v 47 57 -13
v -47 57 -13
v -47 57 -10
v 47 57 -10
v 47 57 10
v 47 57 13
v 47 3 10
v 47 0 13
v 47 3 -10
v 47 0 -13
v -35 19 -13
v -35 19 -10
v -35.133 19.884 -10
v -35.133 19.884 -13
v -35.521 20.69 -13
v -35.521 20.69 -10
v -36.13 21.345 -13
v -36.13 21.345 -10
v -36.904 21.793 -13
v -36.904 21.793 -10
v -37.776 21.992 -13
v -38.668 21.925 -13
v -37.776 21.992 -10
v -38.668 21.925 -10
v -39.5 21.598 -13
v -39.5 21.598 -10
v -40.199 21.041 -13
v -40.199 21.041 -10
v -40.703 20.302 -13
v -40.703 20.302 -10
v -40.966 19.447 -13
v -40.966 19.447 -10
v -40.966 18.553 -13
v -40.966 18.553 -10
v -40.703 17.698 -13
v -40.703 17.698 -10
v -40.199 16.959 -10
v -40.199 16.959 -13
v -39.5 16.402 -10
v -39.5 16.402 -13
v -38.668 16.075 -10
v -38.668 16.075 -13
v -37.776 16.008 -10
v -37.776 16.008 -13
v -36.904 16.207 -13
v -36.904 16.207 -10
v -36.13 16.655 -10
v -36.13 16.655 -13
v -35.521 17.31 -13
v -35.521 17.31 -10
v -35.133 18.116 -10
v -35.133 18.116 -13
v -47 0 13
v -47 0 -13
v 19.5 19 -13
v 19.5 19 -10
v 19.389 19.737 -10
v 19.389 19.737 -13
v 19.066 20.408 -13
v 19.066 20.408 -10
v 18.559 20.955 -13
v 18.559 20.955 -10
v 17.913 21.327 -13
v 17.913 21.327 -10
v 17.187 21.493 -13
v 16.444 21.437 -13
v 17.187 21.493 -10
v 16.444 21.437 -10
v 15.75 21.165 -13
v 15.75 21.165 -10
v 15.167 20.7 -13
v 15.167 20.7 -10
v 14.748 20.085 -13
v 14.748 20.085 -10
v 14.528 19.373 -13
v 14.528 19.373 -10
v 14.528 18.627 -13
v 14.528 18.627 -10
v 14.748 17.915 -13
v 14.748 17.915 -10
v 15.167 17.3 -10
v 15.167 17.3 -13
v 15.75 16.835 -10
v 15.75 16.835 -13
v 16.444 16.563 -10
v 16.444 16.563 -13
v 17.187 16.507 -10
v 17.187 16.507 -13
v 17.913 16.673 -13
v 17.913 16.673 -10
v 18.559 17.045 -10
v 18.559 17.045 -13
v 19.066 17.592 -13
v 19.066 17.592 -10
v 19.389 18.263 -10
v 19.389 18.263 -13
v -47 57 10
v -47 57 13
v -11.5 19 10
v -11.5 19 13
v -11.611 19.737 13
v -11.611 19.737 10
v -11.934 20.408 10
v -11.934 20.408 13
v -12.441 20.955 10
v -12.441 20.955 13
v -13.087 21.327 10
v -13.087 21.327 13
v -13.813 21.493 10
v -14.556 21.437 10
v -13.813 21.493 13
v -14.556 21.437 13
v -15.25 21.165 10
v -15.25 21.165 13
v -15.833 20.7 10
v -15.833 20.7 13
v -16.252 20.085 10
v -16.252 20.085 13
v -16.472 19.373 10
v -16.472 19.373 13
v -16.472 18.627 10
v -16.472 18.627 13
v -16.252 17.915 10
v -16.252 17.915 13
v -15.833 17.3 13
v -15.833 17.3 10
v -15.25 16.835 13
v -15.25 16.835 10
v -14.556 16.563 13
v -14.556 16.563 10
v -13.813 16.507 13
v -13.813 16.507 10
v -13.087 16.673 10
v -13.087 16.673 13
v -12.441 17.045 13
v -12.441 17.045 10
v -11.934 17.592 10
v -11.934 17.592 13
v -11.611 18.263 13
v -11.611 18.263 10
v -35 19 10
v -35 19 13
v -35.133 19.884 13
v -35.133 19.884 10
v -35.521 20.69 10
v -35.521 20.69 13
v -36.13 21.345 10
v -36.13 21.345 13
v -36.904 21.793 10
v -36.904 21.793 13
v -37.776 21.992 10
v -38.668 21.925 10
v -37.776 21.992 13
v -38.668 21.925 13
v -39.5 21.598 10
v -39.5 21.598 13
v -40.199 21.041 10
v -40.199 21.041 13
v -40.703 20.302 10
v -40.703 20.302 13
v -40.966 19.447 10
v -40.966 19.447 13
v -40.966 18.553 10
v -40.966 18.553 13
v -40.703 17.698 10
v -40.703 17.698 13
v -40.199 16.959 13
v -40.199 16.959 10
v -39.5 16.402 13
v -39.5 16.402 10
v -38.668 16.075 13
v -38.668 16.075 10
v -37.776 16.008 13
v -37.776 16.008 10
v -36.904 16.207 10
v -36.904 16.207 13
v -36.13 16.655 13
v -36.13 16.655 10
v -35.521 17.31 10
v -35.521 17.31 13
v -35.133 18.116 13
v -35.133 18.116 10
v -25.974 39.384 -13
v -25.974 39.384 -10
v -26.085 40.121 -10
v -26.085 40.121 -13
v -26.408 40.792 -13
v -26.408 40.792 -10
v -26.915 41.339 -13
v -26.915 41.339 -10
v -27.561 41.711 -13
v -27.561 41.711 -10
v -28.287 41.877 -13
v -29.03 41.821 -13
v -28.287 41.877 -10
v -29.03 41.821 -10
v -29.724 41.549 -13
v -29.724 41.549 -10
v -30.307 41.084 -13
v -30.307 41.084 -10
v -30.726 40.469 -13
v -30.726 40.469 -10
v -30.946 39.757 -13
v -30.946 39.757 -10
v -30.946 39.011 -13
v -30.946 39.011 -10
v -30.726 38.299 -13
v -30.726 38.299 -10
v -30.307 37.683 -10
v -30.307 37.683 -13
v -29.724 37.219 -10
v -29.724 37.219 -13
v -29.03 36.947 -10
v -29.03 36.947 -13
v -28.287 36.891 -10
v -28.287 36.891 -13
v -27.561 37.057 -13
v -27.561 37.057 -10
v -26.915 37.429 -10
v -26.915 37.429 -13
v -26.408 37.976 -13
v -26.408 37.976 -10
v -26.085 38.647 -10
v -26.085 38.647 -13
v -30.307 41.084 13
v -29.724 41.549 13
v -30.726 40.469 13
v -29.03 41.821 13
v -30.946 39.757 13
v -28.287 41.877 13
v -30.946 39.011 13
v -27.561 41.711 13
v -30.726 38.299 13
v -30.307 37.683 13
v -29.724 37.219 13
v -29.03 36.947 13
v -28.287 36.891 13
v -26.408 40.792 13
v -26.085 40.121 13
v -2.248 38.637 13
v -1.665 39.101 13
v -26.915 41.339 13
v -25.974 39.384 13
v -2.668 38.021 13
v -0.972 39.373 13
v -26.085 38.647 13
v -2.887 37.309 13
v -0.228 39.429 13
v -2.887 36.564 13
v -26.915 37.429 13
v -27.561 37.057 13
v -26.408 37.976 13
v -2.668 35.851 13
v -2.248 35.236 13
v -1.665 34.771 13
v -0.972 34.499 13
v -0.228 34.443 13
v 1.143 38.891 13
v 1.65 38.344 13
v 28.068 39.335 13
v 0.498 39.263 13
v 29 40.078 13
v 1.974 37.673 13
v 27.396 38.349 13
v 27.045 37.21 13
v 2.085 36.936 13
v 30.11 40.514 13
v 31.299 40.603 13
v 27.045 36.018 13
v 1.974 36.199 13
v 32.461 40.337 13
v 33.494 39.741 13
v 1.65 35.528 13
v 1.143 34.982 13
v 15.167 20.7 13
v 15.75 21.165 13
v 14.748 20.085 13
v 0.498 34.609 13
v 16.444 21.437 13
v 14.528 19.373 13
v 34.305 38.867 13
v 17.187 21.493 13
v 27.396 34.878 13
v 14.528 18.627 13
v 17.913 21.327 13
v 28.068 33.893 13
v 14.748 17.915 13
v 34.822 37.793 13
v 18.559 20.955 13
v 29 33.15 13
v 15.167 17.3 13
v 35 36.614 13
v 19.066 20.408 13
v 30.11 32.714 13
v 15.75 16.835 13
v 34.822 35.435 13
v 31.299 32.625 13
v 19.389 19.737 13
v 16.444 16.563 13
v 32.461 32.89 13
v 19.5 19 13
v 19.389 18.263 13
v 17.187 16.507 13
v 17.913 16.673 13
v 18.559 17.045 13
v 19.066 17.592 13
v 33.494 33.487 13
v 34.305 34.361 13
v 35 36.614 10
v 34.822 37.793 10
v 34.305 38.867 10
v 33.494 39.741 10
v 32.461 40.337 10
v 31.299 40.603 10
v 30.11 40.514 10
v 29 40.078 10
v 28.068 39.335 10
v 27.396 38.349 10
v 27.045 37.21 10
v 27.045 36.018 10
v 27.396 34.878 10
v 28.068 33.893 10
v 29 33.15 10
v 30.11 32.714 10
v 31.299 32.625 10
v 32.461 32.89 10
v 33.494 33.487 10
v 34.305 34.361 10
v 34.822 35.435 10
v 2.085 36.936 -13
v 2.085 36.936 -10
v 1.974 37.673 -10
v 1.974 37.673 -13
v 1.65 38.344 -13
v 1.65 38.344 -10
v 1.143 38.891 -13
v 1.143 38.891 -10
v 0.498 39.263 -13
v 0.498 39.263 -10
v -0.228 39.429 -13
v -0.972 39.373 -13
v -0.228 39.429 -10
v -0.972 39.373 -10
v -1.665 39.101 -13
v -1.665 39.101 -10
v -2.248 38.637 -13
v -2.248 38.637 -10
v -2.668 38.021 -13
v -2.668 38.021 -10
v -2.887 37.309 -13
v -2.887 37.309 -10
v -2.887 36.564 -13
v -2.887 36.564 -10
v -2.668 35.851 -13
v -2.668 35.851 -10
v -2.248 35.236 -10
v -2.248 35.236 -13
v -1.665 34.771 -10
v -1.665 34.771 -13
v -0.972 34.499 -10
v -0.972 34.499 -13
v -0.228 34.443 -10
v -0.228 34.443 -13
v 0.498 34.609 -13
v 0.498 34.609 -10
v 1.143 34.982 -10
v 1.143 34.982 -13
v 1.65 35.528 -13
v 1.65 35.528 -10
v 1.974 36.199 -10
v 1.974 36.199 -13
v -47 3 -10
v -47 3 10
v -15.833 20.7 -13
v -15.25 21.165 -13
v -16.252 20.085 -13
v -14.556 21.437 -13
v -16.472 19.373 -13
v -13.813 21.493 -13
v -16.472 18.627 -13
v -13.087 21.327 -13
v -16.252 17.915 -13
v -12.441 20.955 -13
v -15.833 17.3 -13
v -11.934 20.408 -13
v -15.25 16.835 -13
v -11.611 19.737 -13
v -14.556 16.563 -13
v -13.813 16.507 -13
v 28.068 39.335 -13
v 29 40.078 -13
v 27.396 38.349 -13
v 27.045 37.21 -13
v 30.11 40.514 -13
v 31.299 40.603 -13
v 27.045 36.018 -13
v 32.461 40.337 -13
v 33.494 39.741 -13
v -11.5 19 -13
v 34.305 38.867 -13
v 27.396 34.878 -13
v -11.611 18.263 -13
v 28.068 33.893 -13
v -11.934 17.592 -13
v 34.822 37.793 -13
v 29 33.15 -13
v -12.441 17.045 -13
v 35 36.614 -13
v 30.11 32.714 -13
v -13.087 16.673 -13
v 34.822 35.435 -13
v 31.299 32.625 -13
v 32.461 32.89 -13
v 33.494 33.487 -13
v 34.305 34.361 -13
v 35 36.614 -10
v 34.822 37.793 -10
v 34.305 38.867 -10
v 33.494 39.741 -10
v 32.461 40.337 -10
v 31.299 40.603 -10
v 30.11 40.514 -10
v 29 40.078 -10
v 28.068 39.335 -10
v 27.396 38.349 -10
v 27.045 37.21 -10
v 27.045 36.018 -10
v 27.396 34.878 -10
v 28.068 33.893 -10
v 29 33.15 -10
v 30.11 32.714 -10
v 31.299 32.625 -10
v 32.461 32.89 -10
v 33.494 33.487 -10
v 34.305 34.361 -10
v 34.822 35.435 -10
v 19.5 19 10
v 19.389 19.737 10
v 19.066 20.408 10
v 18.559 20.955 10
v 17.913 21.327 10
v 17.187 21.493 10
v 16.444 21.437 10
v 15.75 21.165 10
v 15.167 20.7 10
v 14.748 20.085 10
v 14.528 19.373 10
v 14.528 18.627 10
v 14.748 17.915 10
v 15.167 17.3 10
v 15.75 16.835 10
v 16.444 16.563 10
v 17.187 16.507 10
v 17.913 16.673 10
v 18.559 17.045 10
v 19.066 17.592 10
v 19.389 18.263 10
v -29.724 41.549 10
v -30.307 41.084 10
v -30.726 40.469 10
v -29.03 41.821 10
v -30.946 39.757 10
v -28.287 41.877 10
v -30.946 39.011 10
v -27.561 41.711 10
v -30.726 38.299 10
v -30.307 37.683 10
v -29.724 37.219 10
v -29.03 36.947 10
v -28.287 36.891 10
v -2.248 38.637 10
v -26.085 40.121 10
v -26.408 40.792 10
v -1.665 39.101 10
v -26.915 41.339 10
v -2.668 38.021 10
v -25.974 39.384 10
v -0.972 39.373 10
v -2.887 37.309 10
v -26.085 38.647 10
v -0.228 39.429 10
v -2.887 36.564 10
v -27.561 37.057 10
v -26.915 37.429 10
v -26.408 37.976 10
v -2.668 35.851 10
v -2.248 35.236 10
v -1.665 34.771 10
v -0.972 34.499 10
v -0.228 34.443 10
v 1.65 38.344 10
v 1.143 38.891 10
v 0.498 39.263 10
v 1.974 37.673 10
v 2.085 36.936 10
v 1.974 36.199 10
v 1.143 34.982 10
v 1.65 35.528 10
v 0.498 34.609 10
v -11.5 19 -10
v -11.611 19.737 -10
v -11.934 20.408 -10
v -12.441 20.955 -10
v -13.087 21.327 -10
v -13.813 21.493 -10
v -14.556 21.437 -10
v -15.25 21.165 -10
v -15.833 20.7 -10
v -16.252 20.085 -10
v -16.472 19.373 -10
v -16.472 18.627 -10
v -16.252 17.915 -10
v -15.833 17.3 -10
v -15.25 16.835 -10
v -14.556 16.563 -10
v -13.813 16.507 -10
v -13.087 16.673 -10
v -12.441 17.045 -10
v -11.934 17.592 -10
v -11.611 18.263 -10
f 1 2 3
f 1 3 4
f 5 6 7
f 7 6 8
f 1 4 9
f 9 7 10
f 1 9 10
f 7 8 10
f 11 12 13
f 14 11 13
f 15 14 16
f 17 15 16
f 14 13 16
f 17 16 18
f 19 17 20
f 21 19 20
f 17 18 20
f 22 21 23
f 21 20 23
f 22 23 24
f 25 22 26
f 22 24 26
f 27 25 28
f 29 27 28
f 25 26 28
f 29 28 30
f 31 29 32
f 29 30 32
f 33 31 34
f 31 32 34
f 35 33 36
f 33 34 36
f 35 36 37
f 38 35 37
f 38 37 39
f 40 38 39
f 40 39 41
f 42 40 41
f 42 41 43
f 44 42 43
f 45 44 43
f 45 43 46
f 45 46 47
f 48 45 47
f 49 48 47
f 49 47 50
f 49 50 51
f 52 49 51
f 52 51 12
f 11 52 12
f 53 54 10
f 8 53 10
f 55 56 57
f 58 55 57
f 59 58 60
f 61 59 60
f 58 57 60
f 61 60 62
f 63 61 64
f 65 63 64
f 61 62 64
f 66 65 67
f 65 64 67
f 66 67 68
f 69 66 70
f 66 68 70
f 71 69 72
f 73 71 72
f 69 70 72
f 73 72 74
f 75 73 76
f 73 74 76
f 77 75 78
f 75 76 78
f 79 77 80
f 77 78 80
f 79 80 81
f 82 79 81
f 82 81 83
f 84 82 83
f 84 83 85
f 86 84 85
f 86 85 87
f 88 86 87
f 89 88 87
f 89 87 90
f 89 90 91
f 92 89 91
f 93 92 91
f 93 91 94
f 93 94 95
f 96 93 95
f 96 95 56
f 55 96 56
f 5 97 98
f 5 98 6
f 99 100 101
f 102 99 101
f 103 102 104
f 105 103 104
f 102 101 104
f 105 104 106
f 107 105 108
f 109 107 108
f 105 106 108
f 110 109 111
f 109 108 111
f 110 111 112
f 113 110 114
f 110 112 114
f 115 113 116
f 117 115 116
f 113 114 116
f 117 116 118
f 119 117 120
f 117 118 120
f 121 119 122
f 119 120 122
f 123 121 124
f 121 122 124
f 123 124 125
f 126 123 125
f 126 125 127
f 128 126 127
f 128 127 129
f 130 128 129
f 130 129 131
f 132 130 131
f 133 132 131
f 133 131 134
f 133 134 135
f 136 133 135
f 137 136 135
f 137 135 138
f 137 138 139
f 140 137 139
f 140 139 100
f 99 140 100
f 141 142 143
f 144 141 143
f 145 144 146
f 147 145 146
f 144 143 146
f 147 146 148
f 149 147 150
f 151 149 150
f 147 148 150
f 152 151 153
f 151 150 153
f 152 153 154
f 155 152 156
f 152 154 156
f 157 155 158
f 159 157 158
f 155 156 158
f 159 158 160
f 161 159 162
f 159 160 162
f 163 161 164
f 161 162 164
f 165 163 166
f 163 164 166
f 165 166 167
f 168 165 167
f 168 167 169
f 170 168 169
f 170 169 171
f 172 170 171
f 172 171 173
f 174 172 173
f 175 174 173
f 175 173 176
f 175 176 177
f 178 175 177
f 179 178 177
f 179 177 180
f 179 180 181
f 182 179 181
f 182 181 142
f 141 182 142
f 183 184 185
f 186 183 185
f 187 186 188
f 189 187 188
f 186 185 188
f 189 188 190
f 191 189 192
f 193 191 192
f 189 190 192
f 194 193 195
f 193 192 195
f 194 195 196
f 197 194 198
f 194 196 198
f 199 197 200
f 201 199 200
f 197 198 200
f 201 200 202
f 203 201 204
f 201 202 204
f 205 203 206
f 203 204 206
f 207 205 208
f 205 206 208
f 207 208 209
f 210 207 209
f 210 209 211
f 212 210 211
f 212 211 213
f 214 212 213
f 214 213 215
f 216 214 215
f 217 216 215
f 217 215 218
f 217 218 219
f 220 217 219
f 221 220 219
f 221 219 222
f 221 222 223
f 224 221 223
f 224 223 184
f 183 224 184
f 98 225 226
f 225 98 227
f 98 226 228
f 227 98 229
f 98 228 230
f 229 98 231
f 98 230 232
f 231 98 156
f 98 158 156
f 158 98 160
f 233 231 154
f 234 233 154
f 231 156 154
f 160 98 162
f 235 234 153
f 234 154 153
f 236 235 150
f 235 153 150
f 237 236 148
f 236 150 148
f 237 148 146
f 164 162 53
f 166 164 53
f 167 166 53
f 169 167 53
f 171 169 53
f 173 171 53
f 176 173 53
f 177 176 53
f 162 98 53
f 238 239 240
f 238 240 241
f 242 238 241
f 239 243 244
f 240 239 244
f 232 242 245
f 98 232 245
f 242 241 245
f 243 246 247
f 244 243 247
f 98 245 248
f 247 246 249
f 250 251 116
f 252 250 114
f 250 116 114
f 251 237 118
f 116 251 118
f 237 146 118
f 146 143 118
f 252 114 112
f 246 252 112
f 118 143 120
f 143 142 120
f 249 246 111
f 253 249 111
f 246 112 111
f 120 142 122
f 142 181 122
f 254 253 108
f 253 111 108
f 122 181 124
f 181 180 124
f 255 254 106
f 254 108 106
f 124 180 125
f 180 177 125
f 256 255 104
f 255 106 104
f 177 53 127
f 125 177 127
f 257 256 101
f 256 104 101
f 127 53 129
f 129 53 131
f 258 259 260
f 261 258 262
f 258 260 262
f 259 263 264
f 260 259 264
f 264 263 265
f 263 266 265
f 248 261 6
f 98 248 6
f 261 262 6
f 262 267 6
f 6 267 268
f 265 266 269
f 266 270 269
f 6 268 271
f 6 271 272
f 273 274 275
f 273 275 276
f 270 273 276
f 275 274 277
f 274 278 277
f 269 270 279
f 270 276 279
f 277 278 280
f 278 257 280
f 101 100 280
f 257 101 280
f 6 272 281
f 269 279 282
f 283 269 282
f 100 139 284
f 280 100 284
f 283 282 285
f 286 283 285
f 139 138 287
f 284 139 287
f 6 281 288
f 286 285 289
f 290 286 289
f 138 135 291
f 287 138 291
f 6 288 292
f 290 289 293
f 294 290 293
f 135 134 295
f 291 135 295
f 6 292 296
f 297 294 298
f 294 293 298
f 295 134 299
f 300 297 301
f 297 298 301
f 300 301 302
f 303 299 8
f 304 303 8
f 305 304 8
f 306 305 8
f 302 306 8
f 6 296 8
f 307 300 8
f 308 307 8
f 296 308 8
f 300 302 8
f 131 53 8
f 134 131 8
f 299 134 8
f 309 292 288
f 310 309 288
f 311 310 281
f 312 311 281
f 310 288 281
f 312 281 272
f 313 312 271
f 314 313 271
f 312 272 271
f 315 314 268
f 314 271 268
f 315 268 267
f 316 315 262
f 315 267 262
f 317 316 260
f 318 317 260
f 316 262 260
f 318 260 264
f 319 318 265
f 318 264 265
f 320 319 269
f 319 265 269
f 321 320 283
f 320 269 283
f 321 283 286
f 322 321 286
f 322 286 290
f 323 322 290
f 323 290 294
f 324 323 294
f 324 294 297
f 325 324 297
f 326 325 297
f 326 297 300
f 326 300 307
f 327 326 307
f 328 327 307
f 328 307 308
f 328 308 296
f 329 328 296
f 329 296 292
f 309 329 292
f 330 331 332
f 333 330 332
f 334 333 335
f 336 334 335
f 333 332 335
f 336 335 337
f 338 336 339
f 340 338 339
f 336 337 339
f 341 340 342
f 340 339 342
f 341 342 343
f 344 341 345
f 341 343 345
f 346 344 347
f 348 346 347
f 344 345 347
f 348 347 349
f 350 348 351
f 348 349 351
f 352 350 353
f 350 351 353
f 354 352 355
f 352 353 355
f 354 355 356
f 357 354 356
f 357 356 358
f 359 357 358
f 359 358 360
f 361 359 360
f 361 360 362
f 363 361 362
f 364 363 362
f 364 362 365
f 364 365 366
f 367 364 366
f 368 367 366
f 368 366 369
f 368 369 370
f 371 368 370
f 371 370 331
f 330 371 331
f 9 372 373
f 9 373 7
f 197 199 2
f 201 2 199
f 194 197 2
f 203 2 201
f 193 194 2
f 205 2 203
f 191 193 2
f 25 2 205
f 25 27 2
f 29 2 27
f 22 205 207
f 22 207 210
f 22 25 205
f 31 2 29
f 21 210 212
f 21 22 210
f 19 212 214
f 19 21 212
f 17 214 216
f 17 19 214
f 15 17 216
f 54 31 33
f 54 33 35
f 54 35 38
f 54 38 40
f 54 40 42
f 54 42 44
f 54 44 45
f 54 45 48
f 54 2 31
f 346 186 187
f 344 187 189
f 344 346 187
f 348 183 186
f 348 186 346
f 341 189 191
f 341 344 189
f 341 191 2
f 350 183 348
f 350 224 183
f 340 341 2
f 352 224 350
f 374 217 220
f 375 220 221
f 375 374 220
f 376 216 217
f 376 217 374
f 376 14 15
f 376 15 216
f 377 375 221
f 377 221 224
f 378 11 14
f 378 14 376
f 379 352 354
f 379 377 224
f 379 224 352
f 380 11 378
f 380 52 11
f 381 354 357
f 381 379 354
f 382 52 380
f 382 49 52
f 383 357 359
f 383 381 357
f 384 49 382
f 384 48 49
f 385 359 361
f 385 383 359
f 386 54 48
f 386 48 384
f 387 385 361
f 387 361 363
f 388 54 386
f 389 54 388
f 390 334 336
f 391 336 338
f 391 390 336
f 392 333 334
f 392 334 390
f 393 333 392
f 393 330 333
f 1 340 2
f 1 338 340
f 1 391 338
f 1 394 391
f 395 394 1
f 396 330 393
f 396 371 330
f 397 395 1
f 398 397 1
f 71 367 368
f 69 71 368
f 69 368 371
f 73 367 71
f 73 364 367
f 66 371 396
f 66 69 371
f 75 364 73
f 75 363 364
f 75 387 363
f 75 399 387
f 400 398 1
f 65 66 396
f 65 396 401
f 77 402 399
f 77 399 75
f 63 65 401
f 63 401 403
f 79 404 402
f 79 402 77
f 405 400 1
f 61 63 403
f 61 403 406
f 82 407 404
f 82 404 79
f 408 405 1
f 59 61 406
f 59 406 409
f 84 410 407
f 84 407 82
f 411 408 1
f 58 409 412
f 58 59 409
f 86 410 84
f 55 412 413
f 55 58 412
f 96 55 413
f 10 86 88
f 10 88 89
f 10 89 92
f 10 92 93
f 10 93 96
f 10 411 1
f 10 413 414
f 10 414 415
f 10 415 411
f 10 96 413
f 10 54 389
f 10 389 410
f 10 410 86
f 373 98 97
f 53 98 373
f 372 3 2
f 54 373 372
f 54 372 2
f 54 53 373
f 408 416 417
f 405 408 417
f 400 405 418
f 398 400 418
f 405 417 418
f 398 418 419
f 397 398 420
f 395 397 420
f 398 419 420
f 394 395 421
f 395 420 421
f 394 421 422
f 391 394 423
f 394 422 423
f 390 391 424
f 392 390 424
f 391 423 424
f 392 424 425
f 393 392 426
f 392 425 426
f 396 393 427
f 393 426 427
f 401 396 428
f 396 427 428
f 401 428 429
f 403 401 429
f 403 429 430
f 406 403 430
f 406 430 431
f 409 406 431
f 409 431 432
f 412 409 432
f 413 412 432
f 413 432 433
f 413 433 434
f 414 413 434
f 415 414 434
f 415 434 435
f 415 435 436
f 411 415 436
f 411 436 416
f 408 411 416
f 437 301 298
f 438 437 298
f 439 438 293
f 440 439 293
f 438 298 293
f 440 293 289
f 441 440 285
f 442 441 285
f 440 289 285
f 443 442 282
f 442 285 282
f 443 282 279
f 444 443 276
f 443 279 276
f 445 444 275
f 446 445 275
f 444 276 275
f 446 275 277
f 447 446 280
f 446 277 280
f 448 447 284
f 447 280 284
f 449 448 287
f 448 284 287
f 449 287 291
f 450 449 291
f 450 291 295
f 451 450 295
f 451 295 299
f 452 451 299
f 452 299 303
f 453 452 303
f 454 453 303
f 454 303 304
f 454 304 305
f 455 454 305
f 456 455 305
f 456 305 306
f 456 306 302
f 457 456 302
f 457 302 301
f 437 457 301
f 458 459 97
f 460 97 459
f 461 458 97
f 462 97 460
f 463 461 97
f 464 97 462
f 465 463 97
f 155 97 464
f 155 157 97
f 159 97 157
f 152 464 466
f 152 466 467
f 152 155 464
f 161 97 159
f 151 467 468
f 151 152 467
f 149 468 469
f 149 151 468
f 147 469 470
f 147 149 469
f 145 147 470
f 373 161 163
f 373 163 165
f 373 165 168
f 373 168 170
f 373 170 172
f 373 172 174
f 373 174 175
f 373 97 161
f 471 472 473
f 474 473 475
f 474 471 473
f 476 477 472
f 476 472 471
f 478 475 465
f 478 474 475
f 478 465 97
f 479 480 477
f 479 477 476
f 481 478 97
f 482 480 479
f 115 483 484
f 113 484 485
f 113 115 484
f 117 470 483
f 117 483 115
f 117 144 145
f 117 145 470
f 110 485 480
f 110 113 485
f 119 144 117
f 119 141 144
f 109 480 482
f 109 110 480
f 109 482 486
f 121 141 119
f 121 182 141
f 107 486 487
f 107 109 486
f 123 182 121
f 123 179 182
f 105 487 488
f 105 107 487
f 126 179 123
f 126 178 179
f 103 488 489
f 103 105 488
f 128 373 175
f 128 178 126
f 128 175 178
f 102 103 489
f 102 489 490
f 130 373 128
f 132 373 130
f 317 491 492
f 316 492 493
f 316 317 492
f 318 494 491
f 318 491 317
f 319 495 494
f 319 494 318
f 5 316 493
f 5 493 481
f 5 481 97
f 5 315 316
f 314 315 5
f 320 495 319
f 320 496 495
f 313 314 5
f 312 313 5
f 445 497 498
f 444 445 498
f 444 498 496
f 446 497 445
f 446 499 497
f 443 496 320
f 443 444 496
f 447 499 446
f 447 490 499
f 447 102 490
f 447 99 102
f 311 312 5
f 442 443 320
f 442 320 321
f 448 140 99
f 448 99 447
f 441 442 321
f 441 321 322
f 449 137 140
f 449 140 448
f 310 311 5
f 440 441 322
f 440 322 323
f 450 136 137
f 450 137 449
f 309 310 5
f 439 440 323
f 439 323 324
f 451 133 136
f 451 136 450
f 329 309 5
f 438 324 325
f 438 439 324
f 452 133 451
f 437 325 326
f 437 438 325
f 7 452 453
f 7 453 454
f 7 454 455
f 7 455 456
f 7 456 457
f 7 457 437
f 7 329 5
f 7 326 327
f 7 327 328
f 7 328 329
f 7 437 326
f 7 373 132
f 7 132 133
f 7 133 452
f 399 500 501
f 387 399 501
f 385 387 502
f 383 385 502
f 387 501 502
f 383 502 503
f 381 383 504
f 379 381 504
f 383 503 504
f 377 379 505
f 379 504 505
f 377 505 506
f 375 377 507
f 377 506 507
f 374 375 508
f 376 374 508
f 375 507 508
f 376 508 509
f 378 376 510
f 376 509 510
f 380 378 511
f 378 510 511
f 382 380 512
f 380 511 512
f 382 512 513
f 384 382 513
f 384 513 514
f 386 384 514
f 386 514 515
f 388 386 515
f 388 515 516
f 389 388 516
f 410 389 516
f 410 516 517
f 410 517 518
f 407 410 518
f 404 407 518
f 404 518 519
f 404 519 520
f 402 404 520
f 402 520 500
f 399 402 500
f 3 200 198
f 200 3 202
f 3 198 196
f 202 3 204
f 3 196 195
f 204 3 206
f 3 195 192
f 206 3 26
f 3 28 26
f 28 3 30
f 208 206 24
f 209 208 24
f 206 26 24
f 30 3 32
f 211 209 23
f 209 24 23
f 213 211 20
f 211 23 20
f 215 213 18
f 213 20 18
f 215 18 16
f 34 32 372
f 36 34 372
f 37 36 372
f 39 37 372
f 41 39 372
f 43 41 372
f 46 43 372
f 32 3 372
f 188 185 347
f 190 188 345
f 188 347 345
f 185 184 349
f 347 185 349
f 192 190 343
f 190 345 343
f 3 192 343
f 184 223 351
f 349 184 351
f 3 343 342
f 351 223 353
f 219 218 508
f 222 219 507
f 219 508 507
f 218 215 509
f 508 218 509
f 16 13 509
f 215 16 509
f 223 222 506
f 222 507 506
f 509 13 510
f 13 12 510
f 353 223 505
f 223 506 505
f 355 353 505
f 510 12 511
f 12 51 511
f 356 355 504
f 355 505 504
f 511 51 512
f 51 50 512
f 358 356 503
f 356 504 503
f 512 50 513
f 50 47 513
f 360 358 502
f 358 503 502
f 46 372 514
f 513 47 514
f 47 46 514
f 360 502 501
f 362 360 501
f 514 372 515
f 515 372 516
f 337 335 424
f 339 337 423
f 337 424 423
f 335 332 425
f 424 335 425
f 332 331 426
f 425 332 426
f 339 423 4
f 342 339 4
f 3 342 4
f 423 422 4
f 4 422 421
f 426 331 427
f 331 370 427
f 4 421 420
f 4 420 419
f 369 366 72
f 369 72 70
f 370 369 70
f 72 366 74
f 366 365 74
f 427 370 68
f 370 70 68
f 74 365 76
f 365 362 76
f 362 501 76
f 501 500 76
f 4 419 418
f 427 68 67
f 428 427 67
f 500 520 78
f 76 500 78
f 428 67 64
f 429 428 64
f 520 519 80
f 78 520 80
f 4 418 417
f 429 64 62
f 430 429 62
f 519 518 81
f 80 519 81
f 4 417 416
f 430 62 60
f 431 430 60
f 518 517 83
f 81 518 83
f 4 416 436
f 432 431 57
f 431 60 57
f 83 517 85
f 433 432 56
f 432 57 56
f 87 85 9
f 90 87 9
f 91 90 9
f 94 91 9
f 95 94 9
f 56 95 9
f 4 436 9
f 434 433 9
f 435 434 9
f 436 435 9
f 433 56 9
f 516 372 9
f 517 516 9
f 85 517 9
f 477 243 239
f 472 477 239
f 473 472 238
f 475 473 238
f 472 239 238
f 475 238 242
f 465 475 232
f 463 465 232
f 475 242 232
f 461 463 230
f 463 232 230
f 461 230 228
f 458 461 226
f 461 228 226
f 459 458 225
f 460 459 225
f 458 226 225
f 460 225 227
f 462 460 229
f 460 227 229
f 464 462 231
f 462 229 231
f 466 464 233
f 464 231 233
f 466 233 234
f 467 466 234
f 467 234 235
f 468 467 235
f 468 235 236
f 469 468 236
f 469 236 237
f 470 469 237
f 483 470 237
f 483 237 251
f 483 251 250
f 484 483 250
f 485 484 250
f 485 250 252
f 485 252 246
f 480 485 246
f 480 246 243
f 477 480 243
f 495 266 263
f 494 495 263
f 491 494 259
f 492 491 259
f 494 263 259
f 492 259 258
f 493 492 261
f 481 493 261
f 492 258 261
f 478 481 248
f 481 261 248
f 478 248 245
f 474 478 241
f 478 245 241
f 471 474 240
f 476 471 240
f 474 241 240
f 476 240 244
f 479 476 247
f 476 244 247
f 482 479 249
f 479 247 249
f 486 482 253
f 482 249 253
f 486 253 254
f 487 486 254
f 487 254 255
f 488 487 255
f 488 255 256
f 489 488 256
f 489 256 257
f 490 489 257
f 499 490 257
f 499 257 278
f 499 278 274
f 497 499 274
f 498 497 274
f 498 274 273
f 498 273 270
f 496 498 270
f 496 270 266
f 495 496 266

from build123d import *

# Parameters (mm, degrees)
SKETCH_1_W          = 94
SKETCH_1_H          = 26
EXTRUDE_1_DEPTH     = 3
SKETCH_2_W          = 94
SKETCH_2_H          = 3
EXTRUDE_2_DEPTH     = 54
SKETCH_3_R          = 3
SKETCH_3_R_2        = 2.5
SKETCH_3_R_3        = 4
CUT_EXTRUDE_1_DEPTH = 79.319856997


with BuildPart() as part:
    # 스케치1 → 보스-돌출1 (new body)
    with BuildSketch(Plane(origin=(0, 0, 0), x_dir=(1, 0, 0), z_dir=(0, 1, 0))):
        Rectangle(SKETCH_1_W, SKETCH_1_H)
    extrude(amount=EXTRUDE_1_DEPTH)

    # 스케치2 → 보스-돌출2 (add)
    with BuildSketch(Plane(origin=(0, 3, 0), x_dir=(1, 0, 0), z_dir=(0, 1, 0))):
        with Locations((0, 11.5)):
            Rectangle(SKETCH_2_W, SKETCH_2_H)
        with Locations((0, -11.5)):
            Rectangle(SKETCH_2_W, SKETCH_2_H)
    extrude(amount=EXTRUDE_2_DEPTH)

    # 스케치3 → 컷-돌출1 (cut, through all)
    with BuildSketch(Plane.XY.offset(13)):
        with Locations((-38, 19)):
            Circle(SKETCH_3_R)
        with Locations((17, 19)):
            Circle(SKETCH_3_R_2)
        with Locations((-14, 19)):
            Circle(SKETCH_3_R_2)
        with Locations((-28.473958333, 39.383928232)):
            Circle(SKETCH_3_R_2)
        with Locations((-0.415322581, 36.936179621)):
            Circle(SKETCH_3_R_2)
        with Locations((31, 36.613914954)):
            Circle(SKETCH_3_R_3)
    extrude(amount=-CUT_EXTRUDE_1_DEPTH, mode=Mode.SUBTRACT)


solid = part.part
